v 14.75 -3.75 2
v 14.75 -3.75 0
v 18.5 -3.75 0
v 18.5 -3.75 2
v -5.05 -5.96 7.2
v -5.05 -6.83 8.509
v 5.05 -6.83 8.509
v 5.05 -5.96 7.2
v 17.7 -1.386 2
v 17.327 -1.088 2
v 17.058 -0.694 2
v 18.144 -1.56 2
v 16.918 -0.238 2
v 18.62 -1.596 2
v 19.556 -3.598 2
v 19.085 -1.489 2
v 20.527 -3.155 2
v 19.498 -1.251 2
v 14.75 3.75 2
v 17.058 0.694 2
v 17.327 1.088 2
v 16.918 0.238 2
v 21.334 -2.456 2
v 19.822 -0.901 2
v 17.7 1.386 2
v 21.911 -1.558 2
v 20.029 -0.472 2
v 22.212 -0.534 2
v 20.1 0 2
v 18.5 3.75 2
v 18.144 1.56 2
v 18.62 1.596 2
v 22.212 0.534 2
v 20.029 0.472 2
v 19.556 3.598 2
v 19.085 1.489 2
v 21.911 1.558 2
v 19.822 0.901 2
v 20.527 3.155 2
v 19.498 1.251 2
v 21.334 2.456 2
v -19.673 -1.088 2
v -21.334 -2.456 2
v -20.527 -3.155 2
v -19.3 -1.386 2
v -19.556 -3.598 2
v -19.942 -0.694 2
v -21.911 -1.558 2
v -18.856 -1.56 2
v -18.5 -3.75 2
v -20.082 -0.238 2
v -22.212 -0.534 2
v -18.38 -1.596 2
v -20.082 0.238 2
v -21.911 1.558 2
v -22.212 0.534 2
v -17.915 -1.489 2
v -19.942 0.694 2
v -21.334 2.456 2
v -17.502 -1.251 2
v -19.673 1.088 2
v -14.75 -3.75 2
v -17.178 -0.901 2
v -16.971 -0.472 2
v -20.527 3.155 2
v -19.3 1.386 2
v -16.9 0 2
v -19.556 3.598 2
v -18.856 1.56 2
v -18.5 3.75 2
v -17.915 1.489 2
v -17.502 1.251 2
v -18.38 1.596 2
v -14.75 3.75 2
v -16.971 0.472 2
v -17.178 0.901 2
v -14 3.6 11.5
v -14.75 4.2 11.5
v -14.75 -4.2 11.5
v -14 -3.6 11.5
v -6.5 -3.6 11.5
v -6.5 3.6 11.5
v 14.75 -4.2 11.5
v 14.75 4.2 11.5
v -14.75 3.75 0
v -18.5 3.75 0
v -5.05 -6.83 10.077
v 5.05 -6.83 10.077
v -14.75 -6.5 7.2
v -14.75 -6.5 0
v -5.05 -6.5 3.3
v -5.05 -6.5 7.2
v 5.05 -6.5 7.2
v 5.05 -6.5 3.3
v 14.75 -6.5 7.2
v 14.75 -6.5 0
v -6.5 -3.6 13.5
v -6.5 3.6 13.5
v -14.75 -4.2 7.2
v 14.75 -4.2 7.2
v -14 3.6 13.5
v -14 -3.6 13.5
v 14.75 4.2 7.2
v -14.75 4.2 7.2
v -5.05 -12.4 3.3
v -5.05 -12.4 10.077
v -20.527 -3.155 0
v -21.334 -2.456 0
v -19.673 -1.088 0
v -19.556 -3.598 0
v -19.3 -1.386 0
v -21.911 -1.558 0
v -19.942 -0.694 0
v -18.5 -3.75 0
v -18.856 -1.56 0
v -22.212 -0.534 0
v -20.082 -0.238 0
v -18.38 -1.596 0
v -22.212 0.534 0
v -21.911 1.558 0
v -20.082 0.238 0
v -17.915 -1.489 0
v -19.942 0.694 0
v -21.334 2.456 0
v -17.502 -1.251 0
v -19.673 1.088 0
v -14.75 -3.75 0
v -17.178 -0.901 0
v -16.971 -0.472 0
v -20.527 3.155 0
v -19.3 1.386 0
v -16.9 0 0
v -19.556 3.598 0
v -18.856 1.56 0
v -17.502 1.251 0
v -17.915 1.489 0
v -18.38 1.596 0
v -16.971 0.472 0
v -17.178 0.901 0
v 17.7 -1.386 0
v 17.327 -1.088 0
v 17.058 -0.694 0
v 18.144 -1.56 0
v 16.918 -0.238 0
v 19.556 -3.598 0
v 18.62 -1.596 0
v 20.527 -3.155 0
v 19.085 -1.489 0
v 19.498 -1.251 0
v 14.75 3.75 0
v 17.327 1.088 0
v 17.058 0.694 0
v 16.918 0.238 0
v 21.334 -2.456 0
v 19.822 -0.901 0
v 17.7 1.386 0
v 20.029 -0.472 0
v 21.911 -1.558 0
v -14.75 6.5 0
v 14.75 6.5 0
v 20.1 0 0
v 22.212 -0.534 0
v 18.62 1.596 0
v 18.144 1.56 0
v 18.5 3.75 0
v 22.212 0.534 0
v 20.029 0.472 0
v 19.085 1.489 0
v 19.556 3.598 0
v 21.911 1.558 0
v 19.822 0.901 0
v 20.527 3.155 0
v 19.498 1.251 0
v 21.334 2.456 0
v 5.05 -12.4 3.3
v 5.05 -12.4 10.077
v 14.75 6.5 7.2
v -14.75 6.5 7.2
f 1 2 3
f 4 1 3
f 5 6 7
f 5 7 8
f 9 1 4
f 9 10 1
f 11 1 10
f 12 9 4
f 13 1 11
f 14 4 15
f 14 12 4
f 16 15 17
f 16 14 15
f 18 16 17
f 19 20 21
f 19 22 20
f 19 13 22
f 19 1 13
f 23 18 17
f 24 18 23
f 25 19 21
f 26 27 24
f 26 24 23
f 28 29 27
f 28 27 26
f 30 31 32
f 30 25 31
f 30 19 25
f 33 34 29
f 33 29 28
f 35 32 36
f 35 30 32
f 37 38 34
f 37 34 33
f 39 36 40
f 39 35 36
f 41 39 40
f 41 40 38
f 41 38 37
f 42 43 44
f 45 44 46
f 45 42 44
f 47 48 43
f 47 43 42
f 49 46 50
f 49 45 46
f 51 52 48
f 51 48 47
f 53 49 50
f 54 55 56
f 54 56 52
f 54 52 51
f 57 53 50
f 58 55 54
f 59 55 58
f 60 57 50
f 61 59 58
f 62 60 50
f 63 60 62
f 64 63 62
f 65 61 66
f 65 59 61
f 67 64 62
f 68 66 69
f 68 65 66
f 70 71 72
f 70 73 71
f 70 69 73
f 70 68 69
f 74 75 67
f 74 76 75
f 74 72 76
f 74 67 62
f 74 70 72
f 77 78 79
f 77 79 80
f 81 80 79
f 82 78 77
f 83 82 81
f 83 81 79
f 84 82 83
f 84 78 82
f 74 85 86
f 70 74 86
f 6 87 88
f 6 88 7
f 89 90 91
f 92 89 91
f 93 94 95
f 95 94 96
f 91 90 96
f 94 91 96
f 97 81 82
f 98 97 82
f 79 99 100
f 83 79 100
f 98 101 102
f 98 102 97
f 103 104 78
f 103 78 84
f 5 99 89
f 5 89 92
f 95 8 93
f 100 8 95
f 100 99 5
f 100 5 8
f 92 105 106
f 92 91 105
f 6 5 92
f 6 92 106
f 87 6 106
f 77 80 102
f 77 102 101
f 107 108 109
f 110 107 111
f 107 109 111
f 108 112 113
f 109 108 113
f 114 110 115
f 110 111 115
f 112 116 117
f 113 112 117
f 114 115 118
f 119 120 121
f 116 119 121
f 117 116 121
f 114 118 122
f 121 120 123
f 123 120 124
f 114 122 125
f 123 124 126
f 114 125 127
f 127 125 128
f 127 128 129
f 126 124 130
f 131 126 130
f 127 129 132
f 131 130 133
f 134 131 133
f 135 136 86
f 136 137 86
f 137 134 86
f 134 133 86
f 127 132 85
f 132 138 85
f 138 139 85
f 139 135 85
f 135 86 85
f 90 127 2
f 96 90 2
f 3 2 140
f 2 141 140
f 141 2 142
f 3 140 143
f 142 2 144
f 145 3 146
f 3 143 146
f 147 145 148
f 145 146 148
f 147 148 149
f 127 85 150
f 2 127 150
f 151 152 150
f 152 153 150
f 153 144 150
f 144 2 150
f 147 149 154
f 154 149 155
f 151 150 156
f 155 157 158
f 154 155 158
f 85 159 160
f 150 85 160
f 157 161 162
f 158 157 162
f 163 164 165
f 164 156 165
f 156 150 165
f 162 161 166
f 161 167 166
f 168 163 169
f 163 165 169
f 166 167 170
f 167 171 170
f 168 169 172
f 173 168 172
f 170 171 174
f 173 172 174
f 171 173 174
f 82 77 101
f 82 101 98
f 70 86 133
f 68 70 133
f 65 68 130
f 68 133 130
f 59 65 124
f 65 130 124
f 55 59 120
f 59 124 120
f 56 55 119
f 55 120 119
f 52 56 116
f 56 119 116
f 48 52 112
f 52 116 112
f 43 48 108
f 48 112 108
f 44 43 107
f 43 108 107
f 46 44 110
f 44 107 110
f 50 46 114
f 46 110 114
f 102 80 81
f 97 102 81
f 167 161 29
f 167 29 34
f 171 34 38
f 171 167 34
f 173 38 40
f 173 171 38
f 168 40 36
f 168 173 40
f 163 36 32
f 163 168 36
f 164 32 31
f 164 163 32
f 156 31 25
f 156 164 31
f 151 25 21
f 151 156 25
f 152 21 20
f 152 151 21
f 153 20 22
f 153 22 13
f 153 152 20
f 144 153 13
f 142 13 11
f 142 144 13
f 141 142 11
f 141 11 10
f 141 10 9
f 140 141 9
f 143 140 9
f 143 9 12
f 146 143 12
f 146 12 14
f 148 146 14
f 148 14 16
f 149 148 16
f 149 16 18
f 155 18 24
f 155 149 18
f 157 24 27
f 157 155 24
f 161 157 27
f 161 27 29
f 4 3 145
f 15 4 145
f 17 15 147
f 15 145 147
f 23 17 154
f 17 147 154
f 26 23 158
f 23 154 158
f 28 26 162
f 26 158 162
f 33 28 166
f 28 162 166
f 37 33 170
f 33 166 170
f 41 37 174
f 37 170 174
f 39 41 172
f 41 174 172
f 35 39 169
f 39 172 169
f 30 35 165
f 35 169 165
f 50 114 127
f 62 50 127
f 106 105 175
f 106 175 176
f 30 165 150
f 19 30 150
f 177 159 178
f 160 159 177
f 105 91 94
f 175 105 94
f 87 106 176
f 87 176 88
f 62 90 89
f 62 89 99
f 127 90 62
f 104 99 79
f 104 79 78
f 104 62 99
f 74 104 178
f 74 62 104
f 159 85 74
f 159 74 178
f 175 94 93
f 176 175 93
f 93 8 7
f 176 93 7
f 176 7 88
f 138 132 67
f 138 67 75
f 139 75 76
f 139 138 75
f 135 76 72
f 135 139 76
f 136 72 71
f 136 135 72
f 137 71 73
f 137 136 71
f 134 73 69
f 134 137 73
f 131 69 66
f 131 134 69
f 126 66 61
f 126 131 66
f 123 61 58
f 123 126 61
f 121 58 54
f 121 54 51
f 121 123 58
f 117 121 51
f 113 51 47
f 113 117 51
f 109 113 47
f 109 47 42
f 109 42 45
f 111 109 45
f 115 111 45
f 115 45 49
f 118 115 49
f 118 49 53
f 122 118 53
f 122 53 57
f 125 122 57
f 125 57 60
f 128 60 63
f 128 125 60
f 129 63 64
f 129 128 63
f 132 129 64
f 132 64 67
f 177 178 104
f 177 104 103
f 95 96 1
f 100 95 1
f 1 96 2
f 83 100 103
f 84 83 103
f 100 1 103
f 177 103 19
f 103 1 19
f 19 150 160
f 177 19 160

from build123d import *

# Parameters (mm, degrees)
ESQUISSE1_W        = 29.5
ESQUISSE1_H        = 13
BOSS_EXTRU_2_DEPTH = 7.2
ESQUISSE2_W        = 29.5
ESQUISSE2_H        = 8.4
BOSS_EXTRU_3_DEPTH = 4.3
ESQUISSE4_W        = 7.5
ESQUISSE4_H        = 7.2
BOSS_EXTRU_4_DEPTH = 2
ESQUISSE8_W        = 10.1
ESQUISSE8_H        = 5.9
BOSS_EXTRU_5_DEPTH = 1.2
BOSS_EXTRU_6_START = -10.1
BOSS_EXTRU_6_DEPTH = 10.1
ESQUISSE10_R       = 1.6
BOSS_EXTRU_8_DEPTH = 2


with BuildPart() as part:
    # Esquisse1 → Boss.-Extru.2 (new body)
    with BuildSketch(Plane.XY):
        Rectangle(ESQUISSE1_W, ESQUISSE1_H)
    extrude(amount=BOSS_EXTRU_2_DEPTH)

    # Esquisse2 → Boss.-Extru.3 (add)
    with BuildSketch(Plane.XY.offset(7.2)):
        Rectangle(ESQUISSE2_W, ESQUISSE2_H)
    extrude(amount=BOSS_EXTRU_3_DEPTH)

    # Esquisse4 → Boss.-Extru.4 (add)
    with BuildSketch(Plane.XY.offset(11.5)):
        with Locations((-10.25, 0)):
            Rectangle(ESQUISSE4_W, ESQUISSE4_H)
    extrude(amount=BOSS_EXTRU_4_DEPTH)

    # Esquisse8 → Boss.-Extru.5 (add)
    with BuildSketch(Plane.XY.offset(3.3)):
        with Locations((0, -9.45)):
            Rectangle(ESQUISSE8_W, ESQUISSE8_H)
    extrude(amount=BOSS_EXTRU_5_DEPTH)

    # Esquisse9 → Boss.-Extru.6 (add)
    with BuildSketch(Plane(origin=(5.05, 0, 0), x_dir=(0, 0, -1), z_dir=(1, 0, 0)).offset(BOSS_EXTRU_6_START)):
        Polygon((-4.5, -12.4), (-10.0771346, -12.4), (-10.0771346, -6.830479263), (-8.508865165, -6.830479263), (-7.2, -5.960264638), (-7.2, -6.5), (-4.5, -6.5), align=None)
    extrude(amount=BOSS_EXTRU_6_DEPTH)

    # Esquisse10 → Boss.-Extru.8 (add)
    with BuildSketch(Plane.XY):
        with BuildLine():
            Line((18.5, 3.75), (14.75, 3.75))
            Line((14.75, 3.75), (14.75, 0))
            Line((14.75, 0), (14.75, -3.75))
            Line((14.75, -3.75), (18.5, -3.75))
            ThreePointArc((18.5, -3.75), (22.25, 0), (18.5, 3.75))
        make_face()
        with Locations((18.5, 0)):
            Circle(ESQUISSE10_R, mode=Mode.SUBTRACT)
        with BuildLine():
            Line((-18.5, -3.75), (-14.75, -3.75))
            Line((-14.75, -3.75), (-14.75, 0))
            Line((-14.75, 0), (-14.75, 3.75))
            Line((-14.75, 3.75), (-18.5, 3.75))
            ThreePointArc((-18.5, 3.75), (-22.25, 0), (-18.5, -3.75))
        make_face()
        with Locations((-18.5, 0)):
            Circle(ESQUISSE10_R, mode=Mode.SUBTRACT)
    extrude(amount=BOSS_EXTRU_8_DEPTH)


solid = part.part
